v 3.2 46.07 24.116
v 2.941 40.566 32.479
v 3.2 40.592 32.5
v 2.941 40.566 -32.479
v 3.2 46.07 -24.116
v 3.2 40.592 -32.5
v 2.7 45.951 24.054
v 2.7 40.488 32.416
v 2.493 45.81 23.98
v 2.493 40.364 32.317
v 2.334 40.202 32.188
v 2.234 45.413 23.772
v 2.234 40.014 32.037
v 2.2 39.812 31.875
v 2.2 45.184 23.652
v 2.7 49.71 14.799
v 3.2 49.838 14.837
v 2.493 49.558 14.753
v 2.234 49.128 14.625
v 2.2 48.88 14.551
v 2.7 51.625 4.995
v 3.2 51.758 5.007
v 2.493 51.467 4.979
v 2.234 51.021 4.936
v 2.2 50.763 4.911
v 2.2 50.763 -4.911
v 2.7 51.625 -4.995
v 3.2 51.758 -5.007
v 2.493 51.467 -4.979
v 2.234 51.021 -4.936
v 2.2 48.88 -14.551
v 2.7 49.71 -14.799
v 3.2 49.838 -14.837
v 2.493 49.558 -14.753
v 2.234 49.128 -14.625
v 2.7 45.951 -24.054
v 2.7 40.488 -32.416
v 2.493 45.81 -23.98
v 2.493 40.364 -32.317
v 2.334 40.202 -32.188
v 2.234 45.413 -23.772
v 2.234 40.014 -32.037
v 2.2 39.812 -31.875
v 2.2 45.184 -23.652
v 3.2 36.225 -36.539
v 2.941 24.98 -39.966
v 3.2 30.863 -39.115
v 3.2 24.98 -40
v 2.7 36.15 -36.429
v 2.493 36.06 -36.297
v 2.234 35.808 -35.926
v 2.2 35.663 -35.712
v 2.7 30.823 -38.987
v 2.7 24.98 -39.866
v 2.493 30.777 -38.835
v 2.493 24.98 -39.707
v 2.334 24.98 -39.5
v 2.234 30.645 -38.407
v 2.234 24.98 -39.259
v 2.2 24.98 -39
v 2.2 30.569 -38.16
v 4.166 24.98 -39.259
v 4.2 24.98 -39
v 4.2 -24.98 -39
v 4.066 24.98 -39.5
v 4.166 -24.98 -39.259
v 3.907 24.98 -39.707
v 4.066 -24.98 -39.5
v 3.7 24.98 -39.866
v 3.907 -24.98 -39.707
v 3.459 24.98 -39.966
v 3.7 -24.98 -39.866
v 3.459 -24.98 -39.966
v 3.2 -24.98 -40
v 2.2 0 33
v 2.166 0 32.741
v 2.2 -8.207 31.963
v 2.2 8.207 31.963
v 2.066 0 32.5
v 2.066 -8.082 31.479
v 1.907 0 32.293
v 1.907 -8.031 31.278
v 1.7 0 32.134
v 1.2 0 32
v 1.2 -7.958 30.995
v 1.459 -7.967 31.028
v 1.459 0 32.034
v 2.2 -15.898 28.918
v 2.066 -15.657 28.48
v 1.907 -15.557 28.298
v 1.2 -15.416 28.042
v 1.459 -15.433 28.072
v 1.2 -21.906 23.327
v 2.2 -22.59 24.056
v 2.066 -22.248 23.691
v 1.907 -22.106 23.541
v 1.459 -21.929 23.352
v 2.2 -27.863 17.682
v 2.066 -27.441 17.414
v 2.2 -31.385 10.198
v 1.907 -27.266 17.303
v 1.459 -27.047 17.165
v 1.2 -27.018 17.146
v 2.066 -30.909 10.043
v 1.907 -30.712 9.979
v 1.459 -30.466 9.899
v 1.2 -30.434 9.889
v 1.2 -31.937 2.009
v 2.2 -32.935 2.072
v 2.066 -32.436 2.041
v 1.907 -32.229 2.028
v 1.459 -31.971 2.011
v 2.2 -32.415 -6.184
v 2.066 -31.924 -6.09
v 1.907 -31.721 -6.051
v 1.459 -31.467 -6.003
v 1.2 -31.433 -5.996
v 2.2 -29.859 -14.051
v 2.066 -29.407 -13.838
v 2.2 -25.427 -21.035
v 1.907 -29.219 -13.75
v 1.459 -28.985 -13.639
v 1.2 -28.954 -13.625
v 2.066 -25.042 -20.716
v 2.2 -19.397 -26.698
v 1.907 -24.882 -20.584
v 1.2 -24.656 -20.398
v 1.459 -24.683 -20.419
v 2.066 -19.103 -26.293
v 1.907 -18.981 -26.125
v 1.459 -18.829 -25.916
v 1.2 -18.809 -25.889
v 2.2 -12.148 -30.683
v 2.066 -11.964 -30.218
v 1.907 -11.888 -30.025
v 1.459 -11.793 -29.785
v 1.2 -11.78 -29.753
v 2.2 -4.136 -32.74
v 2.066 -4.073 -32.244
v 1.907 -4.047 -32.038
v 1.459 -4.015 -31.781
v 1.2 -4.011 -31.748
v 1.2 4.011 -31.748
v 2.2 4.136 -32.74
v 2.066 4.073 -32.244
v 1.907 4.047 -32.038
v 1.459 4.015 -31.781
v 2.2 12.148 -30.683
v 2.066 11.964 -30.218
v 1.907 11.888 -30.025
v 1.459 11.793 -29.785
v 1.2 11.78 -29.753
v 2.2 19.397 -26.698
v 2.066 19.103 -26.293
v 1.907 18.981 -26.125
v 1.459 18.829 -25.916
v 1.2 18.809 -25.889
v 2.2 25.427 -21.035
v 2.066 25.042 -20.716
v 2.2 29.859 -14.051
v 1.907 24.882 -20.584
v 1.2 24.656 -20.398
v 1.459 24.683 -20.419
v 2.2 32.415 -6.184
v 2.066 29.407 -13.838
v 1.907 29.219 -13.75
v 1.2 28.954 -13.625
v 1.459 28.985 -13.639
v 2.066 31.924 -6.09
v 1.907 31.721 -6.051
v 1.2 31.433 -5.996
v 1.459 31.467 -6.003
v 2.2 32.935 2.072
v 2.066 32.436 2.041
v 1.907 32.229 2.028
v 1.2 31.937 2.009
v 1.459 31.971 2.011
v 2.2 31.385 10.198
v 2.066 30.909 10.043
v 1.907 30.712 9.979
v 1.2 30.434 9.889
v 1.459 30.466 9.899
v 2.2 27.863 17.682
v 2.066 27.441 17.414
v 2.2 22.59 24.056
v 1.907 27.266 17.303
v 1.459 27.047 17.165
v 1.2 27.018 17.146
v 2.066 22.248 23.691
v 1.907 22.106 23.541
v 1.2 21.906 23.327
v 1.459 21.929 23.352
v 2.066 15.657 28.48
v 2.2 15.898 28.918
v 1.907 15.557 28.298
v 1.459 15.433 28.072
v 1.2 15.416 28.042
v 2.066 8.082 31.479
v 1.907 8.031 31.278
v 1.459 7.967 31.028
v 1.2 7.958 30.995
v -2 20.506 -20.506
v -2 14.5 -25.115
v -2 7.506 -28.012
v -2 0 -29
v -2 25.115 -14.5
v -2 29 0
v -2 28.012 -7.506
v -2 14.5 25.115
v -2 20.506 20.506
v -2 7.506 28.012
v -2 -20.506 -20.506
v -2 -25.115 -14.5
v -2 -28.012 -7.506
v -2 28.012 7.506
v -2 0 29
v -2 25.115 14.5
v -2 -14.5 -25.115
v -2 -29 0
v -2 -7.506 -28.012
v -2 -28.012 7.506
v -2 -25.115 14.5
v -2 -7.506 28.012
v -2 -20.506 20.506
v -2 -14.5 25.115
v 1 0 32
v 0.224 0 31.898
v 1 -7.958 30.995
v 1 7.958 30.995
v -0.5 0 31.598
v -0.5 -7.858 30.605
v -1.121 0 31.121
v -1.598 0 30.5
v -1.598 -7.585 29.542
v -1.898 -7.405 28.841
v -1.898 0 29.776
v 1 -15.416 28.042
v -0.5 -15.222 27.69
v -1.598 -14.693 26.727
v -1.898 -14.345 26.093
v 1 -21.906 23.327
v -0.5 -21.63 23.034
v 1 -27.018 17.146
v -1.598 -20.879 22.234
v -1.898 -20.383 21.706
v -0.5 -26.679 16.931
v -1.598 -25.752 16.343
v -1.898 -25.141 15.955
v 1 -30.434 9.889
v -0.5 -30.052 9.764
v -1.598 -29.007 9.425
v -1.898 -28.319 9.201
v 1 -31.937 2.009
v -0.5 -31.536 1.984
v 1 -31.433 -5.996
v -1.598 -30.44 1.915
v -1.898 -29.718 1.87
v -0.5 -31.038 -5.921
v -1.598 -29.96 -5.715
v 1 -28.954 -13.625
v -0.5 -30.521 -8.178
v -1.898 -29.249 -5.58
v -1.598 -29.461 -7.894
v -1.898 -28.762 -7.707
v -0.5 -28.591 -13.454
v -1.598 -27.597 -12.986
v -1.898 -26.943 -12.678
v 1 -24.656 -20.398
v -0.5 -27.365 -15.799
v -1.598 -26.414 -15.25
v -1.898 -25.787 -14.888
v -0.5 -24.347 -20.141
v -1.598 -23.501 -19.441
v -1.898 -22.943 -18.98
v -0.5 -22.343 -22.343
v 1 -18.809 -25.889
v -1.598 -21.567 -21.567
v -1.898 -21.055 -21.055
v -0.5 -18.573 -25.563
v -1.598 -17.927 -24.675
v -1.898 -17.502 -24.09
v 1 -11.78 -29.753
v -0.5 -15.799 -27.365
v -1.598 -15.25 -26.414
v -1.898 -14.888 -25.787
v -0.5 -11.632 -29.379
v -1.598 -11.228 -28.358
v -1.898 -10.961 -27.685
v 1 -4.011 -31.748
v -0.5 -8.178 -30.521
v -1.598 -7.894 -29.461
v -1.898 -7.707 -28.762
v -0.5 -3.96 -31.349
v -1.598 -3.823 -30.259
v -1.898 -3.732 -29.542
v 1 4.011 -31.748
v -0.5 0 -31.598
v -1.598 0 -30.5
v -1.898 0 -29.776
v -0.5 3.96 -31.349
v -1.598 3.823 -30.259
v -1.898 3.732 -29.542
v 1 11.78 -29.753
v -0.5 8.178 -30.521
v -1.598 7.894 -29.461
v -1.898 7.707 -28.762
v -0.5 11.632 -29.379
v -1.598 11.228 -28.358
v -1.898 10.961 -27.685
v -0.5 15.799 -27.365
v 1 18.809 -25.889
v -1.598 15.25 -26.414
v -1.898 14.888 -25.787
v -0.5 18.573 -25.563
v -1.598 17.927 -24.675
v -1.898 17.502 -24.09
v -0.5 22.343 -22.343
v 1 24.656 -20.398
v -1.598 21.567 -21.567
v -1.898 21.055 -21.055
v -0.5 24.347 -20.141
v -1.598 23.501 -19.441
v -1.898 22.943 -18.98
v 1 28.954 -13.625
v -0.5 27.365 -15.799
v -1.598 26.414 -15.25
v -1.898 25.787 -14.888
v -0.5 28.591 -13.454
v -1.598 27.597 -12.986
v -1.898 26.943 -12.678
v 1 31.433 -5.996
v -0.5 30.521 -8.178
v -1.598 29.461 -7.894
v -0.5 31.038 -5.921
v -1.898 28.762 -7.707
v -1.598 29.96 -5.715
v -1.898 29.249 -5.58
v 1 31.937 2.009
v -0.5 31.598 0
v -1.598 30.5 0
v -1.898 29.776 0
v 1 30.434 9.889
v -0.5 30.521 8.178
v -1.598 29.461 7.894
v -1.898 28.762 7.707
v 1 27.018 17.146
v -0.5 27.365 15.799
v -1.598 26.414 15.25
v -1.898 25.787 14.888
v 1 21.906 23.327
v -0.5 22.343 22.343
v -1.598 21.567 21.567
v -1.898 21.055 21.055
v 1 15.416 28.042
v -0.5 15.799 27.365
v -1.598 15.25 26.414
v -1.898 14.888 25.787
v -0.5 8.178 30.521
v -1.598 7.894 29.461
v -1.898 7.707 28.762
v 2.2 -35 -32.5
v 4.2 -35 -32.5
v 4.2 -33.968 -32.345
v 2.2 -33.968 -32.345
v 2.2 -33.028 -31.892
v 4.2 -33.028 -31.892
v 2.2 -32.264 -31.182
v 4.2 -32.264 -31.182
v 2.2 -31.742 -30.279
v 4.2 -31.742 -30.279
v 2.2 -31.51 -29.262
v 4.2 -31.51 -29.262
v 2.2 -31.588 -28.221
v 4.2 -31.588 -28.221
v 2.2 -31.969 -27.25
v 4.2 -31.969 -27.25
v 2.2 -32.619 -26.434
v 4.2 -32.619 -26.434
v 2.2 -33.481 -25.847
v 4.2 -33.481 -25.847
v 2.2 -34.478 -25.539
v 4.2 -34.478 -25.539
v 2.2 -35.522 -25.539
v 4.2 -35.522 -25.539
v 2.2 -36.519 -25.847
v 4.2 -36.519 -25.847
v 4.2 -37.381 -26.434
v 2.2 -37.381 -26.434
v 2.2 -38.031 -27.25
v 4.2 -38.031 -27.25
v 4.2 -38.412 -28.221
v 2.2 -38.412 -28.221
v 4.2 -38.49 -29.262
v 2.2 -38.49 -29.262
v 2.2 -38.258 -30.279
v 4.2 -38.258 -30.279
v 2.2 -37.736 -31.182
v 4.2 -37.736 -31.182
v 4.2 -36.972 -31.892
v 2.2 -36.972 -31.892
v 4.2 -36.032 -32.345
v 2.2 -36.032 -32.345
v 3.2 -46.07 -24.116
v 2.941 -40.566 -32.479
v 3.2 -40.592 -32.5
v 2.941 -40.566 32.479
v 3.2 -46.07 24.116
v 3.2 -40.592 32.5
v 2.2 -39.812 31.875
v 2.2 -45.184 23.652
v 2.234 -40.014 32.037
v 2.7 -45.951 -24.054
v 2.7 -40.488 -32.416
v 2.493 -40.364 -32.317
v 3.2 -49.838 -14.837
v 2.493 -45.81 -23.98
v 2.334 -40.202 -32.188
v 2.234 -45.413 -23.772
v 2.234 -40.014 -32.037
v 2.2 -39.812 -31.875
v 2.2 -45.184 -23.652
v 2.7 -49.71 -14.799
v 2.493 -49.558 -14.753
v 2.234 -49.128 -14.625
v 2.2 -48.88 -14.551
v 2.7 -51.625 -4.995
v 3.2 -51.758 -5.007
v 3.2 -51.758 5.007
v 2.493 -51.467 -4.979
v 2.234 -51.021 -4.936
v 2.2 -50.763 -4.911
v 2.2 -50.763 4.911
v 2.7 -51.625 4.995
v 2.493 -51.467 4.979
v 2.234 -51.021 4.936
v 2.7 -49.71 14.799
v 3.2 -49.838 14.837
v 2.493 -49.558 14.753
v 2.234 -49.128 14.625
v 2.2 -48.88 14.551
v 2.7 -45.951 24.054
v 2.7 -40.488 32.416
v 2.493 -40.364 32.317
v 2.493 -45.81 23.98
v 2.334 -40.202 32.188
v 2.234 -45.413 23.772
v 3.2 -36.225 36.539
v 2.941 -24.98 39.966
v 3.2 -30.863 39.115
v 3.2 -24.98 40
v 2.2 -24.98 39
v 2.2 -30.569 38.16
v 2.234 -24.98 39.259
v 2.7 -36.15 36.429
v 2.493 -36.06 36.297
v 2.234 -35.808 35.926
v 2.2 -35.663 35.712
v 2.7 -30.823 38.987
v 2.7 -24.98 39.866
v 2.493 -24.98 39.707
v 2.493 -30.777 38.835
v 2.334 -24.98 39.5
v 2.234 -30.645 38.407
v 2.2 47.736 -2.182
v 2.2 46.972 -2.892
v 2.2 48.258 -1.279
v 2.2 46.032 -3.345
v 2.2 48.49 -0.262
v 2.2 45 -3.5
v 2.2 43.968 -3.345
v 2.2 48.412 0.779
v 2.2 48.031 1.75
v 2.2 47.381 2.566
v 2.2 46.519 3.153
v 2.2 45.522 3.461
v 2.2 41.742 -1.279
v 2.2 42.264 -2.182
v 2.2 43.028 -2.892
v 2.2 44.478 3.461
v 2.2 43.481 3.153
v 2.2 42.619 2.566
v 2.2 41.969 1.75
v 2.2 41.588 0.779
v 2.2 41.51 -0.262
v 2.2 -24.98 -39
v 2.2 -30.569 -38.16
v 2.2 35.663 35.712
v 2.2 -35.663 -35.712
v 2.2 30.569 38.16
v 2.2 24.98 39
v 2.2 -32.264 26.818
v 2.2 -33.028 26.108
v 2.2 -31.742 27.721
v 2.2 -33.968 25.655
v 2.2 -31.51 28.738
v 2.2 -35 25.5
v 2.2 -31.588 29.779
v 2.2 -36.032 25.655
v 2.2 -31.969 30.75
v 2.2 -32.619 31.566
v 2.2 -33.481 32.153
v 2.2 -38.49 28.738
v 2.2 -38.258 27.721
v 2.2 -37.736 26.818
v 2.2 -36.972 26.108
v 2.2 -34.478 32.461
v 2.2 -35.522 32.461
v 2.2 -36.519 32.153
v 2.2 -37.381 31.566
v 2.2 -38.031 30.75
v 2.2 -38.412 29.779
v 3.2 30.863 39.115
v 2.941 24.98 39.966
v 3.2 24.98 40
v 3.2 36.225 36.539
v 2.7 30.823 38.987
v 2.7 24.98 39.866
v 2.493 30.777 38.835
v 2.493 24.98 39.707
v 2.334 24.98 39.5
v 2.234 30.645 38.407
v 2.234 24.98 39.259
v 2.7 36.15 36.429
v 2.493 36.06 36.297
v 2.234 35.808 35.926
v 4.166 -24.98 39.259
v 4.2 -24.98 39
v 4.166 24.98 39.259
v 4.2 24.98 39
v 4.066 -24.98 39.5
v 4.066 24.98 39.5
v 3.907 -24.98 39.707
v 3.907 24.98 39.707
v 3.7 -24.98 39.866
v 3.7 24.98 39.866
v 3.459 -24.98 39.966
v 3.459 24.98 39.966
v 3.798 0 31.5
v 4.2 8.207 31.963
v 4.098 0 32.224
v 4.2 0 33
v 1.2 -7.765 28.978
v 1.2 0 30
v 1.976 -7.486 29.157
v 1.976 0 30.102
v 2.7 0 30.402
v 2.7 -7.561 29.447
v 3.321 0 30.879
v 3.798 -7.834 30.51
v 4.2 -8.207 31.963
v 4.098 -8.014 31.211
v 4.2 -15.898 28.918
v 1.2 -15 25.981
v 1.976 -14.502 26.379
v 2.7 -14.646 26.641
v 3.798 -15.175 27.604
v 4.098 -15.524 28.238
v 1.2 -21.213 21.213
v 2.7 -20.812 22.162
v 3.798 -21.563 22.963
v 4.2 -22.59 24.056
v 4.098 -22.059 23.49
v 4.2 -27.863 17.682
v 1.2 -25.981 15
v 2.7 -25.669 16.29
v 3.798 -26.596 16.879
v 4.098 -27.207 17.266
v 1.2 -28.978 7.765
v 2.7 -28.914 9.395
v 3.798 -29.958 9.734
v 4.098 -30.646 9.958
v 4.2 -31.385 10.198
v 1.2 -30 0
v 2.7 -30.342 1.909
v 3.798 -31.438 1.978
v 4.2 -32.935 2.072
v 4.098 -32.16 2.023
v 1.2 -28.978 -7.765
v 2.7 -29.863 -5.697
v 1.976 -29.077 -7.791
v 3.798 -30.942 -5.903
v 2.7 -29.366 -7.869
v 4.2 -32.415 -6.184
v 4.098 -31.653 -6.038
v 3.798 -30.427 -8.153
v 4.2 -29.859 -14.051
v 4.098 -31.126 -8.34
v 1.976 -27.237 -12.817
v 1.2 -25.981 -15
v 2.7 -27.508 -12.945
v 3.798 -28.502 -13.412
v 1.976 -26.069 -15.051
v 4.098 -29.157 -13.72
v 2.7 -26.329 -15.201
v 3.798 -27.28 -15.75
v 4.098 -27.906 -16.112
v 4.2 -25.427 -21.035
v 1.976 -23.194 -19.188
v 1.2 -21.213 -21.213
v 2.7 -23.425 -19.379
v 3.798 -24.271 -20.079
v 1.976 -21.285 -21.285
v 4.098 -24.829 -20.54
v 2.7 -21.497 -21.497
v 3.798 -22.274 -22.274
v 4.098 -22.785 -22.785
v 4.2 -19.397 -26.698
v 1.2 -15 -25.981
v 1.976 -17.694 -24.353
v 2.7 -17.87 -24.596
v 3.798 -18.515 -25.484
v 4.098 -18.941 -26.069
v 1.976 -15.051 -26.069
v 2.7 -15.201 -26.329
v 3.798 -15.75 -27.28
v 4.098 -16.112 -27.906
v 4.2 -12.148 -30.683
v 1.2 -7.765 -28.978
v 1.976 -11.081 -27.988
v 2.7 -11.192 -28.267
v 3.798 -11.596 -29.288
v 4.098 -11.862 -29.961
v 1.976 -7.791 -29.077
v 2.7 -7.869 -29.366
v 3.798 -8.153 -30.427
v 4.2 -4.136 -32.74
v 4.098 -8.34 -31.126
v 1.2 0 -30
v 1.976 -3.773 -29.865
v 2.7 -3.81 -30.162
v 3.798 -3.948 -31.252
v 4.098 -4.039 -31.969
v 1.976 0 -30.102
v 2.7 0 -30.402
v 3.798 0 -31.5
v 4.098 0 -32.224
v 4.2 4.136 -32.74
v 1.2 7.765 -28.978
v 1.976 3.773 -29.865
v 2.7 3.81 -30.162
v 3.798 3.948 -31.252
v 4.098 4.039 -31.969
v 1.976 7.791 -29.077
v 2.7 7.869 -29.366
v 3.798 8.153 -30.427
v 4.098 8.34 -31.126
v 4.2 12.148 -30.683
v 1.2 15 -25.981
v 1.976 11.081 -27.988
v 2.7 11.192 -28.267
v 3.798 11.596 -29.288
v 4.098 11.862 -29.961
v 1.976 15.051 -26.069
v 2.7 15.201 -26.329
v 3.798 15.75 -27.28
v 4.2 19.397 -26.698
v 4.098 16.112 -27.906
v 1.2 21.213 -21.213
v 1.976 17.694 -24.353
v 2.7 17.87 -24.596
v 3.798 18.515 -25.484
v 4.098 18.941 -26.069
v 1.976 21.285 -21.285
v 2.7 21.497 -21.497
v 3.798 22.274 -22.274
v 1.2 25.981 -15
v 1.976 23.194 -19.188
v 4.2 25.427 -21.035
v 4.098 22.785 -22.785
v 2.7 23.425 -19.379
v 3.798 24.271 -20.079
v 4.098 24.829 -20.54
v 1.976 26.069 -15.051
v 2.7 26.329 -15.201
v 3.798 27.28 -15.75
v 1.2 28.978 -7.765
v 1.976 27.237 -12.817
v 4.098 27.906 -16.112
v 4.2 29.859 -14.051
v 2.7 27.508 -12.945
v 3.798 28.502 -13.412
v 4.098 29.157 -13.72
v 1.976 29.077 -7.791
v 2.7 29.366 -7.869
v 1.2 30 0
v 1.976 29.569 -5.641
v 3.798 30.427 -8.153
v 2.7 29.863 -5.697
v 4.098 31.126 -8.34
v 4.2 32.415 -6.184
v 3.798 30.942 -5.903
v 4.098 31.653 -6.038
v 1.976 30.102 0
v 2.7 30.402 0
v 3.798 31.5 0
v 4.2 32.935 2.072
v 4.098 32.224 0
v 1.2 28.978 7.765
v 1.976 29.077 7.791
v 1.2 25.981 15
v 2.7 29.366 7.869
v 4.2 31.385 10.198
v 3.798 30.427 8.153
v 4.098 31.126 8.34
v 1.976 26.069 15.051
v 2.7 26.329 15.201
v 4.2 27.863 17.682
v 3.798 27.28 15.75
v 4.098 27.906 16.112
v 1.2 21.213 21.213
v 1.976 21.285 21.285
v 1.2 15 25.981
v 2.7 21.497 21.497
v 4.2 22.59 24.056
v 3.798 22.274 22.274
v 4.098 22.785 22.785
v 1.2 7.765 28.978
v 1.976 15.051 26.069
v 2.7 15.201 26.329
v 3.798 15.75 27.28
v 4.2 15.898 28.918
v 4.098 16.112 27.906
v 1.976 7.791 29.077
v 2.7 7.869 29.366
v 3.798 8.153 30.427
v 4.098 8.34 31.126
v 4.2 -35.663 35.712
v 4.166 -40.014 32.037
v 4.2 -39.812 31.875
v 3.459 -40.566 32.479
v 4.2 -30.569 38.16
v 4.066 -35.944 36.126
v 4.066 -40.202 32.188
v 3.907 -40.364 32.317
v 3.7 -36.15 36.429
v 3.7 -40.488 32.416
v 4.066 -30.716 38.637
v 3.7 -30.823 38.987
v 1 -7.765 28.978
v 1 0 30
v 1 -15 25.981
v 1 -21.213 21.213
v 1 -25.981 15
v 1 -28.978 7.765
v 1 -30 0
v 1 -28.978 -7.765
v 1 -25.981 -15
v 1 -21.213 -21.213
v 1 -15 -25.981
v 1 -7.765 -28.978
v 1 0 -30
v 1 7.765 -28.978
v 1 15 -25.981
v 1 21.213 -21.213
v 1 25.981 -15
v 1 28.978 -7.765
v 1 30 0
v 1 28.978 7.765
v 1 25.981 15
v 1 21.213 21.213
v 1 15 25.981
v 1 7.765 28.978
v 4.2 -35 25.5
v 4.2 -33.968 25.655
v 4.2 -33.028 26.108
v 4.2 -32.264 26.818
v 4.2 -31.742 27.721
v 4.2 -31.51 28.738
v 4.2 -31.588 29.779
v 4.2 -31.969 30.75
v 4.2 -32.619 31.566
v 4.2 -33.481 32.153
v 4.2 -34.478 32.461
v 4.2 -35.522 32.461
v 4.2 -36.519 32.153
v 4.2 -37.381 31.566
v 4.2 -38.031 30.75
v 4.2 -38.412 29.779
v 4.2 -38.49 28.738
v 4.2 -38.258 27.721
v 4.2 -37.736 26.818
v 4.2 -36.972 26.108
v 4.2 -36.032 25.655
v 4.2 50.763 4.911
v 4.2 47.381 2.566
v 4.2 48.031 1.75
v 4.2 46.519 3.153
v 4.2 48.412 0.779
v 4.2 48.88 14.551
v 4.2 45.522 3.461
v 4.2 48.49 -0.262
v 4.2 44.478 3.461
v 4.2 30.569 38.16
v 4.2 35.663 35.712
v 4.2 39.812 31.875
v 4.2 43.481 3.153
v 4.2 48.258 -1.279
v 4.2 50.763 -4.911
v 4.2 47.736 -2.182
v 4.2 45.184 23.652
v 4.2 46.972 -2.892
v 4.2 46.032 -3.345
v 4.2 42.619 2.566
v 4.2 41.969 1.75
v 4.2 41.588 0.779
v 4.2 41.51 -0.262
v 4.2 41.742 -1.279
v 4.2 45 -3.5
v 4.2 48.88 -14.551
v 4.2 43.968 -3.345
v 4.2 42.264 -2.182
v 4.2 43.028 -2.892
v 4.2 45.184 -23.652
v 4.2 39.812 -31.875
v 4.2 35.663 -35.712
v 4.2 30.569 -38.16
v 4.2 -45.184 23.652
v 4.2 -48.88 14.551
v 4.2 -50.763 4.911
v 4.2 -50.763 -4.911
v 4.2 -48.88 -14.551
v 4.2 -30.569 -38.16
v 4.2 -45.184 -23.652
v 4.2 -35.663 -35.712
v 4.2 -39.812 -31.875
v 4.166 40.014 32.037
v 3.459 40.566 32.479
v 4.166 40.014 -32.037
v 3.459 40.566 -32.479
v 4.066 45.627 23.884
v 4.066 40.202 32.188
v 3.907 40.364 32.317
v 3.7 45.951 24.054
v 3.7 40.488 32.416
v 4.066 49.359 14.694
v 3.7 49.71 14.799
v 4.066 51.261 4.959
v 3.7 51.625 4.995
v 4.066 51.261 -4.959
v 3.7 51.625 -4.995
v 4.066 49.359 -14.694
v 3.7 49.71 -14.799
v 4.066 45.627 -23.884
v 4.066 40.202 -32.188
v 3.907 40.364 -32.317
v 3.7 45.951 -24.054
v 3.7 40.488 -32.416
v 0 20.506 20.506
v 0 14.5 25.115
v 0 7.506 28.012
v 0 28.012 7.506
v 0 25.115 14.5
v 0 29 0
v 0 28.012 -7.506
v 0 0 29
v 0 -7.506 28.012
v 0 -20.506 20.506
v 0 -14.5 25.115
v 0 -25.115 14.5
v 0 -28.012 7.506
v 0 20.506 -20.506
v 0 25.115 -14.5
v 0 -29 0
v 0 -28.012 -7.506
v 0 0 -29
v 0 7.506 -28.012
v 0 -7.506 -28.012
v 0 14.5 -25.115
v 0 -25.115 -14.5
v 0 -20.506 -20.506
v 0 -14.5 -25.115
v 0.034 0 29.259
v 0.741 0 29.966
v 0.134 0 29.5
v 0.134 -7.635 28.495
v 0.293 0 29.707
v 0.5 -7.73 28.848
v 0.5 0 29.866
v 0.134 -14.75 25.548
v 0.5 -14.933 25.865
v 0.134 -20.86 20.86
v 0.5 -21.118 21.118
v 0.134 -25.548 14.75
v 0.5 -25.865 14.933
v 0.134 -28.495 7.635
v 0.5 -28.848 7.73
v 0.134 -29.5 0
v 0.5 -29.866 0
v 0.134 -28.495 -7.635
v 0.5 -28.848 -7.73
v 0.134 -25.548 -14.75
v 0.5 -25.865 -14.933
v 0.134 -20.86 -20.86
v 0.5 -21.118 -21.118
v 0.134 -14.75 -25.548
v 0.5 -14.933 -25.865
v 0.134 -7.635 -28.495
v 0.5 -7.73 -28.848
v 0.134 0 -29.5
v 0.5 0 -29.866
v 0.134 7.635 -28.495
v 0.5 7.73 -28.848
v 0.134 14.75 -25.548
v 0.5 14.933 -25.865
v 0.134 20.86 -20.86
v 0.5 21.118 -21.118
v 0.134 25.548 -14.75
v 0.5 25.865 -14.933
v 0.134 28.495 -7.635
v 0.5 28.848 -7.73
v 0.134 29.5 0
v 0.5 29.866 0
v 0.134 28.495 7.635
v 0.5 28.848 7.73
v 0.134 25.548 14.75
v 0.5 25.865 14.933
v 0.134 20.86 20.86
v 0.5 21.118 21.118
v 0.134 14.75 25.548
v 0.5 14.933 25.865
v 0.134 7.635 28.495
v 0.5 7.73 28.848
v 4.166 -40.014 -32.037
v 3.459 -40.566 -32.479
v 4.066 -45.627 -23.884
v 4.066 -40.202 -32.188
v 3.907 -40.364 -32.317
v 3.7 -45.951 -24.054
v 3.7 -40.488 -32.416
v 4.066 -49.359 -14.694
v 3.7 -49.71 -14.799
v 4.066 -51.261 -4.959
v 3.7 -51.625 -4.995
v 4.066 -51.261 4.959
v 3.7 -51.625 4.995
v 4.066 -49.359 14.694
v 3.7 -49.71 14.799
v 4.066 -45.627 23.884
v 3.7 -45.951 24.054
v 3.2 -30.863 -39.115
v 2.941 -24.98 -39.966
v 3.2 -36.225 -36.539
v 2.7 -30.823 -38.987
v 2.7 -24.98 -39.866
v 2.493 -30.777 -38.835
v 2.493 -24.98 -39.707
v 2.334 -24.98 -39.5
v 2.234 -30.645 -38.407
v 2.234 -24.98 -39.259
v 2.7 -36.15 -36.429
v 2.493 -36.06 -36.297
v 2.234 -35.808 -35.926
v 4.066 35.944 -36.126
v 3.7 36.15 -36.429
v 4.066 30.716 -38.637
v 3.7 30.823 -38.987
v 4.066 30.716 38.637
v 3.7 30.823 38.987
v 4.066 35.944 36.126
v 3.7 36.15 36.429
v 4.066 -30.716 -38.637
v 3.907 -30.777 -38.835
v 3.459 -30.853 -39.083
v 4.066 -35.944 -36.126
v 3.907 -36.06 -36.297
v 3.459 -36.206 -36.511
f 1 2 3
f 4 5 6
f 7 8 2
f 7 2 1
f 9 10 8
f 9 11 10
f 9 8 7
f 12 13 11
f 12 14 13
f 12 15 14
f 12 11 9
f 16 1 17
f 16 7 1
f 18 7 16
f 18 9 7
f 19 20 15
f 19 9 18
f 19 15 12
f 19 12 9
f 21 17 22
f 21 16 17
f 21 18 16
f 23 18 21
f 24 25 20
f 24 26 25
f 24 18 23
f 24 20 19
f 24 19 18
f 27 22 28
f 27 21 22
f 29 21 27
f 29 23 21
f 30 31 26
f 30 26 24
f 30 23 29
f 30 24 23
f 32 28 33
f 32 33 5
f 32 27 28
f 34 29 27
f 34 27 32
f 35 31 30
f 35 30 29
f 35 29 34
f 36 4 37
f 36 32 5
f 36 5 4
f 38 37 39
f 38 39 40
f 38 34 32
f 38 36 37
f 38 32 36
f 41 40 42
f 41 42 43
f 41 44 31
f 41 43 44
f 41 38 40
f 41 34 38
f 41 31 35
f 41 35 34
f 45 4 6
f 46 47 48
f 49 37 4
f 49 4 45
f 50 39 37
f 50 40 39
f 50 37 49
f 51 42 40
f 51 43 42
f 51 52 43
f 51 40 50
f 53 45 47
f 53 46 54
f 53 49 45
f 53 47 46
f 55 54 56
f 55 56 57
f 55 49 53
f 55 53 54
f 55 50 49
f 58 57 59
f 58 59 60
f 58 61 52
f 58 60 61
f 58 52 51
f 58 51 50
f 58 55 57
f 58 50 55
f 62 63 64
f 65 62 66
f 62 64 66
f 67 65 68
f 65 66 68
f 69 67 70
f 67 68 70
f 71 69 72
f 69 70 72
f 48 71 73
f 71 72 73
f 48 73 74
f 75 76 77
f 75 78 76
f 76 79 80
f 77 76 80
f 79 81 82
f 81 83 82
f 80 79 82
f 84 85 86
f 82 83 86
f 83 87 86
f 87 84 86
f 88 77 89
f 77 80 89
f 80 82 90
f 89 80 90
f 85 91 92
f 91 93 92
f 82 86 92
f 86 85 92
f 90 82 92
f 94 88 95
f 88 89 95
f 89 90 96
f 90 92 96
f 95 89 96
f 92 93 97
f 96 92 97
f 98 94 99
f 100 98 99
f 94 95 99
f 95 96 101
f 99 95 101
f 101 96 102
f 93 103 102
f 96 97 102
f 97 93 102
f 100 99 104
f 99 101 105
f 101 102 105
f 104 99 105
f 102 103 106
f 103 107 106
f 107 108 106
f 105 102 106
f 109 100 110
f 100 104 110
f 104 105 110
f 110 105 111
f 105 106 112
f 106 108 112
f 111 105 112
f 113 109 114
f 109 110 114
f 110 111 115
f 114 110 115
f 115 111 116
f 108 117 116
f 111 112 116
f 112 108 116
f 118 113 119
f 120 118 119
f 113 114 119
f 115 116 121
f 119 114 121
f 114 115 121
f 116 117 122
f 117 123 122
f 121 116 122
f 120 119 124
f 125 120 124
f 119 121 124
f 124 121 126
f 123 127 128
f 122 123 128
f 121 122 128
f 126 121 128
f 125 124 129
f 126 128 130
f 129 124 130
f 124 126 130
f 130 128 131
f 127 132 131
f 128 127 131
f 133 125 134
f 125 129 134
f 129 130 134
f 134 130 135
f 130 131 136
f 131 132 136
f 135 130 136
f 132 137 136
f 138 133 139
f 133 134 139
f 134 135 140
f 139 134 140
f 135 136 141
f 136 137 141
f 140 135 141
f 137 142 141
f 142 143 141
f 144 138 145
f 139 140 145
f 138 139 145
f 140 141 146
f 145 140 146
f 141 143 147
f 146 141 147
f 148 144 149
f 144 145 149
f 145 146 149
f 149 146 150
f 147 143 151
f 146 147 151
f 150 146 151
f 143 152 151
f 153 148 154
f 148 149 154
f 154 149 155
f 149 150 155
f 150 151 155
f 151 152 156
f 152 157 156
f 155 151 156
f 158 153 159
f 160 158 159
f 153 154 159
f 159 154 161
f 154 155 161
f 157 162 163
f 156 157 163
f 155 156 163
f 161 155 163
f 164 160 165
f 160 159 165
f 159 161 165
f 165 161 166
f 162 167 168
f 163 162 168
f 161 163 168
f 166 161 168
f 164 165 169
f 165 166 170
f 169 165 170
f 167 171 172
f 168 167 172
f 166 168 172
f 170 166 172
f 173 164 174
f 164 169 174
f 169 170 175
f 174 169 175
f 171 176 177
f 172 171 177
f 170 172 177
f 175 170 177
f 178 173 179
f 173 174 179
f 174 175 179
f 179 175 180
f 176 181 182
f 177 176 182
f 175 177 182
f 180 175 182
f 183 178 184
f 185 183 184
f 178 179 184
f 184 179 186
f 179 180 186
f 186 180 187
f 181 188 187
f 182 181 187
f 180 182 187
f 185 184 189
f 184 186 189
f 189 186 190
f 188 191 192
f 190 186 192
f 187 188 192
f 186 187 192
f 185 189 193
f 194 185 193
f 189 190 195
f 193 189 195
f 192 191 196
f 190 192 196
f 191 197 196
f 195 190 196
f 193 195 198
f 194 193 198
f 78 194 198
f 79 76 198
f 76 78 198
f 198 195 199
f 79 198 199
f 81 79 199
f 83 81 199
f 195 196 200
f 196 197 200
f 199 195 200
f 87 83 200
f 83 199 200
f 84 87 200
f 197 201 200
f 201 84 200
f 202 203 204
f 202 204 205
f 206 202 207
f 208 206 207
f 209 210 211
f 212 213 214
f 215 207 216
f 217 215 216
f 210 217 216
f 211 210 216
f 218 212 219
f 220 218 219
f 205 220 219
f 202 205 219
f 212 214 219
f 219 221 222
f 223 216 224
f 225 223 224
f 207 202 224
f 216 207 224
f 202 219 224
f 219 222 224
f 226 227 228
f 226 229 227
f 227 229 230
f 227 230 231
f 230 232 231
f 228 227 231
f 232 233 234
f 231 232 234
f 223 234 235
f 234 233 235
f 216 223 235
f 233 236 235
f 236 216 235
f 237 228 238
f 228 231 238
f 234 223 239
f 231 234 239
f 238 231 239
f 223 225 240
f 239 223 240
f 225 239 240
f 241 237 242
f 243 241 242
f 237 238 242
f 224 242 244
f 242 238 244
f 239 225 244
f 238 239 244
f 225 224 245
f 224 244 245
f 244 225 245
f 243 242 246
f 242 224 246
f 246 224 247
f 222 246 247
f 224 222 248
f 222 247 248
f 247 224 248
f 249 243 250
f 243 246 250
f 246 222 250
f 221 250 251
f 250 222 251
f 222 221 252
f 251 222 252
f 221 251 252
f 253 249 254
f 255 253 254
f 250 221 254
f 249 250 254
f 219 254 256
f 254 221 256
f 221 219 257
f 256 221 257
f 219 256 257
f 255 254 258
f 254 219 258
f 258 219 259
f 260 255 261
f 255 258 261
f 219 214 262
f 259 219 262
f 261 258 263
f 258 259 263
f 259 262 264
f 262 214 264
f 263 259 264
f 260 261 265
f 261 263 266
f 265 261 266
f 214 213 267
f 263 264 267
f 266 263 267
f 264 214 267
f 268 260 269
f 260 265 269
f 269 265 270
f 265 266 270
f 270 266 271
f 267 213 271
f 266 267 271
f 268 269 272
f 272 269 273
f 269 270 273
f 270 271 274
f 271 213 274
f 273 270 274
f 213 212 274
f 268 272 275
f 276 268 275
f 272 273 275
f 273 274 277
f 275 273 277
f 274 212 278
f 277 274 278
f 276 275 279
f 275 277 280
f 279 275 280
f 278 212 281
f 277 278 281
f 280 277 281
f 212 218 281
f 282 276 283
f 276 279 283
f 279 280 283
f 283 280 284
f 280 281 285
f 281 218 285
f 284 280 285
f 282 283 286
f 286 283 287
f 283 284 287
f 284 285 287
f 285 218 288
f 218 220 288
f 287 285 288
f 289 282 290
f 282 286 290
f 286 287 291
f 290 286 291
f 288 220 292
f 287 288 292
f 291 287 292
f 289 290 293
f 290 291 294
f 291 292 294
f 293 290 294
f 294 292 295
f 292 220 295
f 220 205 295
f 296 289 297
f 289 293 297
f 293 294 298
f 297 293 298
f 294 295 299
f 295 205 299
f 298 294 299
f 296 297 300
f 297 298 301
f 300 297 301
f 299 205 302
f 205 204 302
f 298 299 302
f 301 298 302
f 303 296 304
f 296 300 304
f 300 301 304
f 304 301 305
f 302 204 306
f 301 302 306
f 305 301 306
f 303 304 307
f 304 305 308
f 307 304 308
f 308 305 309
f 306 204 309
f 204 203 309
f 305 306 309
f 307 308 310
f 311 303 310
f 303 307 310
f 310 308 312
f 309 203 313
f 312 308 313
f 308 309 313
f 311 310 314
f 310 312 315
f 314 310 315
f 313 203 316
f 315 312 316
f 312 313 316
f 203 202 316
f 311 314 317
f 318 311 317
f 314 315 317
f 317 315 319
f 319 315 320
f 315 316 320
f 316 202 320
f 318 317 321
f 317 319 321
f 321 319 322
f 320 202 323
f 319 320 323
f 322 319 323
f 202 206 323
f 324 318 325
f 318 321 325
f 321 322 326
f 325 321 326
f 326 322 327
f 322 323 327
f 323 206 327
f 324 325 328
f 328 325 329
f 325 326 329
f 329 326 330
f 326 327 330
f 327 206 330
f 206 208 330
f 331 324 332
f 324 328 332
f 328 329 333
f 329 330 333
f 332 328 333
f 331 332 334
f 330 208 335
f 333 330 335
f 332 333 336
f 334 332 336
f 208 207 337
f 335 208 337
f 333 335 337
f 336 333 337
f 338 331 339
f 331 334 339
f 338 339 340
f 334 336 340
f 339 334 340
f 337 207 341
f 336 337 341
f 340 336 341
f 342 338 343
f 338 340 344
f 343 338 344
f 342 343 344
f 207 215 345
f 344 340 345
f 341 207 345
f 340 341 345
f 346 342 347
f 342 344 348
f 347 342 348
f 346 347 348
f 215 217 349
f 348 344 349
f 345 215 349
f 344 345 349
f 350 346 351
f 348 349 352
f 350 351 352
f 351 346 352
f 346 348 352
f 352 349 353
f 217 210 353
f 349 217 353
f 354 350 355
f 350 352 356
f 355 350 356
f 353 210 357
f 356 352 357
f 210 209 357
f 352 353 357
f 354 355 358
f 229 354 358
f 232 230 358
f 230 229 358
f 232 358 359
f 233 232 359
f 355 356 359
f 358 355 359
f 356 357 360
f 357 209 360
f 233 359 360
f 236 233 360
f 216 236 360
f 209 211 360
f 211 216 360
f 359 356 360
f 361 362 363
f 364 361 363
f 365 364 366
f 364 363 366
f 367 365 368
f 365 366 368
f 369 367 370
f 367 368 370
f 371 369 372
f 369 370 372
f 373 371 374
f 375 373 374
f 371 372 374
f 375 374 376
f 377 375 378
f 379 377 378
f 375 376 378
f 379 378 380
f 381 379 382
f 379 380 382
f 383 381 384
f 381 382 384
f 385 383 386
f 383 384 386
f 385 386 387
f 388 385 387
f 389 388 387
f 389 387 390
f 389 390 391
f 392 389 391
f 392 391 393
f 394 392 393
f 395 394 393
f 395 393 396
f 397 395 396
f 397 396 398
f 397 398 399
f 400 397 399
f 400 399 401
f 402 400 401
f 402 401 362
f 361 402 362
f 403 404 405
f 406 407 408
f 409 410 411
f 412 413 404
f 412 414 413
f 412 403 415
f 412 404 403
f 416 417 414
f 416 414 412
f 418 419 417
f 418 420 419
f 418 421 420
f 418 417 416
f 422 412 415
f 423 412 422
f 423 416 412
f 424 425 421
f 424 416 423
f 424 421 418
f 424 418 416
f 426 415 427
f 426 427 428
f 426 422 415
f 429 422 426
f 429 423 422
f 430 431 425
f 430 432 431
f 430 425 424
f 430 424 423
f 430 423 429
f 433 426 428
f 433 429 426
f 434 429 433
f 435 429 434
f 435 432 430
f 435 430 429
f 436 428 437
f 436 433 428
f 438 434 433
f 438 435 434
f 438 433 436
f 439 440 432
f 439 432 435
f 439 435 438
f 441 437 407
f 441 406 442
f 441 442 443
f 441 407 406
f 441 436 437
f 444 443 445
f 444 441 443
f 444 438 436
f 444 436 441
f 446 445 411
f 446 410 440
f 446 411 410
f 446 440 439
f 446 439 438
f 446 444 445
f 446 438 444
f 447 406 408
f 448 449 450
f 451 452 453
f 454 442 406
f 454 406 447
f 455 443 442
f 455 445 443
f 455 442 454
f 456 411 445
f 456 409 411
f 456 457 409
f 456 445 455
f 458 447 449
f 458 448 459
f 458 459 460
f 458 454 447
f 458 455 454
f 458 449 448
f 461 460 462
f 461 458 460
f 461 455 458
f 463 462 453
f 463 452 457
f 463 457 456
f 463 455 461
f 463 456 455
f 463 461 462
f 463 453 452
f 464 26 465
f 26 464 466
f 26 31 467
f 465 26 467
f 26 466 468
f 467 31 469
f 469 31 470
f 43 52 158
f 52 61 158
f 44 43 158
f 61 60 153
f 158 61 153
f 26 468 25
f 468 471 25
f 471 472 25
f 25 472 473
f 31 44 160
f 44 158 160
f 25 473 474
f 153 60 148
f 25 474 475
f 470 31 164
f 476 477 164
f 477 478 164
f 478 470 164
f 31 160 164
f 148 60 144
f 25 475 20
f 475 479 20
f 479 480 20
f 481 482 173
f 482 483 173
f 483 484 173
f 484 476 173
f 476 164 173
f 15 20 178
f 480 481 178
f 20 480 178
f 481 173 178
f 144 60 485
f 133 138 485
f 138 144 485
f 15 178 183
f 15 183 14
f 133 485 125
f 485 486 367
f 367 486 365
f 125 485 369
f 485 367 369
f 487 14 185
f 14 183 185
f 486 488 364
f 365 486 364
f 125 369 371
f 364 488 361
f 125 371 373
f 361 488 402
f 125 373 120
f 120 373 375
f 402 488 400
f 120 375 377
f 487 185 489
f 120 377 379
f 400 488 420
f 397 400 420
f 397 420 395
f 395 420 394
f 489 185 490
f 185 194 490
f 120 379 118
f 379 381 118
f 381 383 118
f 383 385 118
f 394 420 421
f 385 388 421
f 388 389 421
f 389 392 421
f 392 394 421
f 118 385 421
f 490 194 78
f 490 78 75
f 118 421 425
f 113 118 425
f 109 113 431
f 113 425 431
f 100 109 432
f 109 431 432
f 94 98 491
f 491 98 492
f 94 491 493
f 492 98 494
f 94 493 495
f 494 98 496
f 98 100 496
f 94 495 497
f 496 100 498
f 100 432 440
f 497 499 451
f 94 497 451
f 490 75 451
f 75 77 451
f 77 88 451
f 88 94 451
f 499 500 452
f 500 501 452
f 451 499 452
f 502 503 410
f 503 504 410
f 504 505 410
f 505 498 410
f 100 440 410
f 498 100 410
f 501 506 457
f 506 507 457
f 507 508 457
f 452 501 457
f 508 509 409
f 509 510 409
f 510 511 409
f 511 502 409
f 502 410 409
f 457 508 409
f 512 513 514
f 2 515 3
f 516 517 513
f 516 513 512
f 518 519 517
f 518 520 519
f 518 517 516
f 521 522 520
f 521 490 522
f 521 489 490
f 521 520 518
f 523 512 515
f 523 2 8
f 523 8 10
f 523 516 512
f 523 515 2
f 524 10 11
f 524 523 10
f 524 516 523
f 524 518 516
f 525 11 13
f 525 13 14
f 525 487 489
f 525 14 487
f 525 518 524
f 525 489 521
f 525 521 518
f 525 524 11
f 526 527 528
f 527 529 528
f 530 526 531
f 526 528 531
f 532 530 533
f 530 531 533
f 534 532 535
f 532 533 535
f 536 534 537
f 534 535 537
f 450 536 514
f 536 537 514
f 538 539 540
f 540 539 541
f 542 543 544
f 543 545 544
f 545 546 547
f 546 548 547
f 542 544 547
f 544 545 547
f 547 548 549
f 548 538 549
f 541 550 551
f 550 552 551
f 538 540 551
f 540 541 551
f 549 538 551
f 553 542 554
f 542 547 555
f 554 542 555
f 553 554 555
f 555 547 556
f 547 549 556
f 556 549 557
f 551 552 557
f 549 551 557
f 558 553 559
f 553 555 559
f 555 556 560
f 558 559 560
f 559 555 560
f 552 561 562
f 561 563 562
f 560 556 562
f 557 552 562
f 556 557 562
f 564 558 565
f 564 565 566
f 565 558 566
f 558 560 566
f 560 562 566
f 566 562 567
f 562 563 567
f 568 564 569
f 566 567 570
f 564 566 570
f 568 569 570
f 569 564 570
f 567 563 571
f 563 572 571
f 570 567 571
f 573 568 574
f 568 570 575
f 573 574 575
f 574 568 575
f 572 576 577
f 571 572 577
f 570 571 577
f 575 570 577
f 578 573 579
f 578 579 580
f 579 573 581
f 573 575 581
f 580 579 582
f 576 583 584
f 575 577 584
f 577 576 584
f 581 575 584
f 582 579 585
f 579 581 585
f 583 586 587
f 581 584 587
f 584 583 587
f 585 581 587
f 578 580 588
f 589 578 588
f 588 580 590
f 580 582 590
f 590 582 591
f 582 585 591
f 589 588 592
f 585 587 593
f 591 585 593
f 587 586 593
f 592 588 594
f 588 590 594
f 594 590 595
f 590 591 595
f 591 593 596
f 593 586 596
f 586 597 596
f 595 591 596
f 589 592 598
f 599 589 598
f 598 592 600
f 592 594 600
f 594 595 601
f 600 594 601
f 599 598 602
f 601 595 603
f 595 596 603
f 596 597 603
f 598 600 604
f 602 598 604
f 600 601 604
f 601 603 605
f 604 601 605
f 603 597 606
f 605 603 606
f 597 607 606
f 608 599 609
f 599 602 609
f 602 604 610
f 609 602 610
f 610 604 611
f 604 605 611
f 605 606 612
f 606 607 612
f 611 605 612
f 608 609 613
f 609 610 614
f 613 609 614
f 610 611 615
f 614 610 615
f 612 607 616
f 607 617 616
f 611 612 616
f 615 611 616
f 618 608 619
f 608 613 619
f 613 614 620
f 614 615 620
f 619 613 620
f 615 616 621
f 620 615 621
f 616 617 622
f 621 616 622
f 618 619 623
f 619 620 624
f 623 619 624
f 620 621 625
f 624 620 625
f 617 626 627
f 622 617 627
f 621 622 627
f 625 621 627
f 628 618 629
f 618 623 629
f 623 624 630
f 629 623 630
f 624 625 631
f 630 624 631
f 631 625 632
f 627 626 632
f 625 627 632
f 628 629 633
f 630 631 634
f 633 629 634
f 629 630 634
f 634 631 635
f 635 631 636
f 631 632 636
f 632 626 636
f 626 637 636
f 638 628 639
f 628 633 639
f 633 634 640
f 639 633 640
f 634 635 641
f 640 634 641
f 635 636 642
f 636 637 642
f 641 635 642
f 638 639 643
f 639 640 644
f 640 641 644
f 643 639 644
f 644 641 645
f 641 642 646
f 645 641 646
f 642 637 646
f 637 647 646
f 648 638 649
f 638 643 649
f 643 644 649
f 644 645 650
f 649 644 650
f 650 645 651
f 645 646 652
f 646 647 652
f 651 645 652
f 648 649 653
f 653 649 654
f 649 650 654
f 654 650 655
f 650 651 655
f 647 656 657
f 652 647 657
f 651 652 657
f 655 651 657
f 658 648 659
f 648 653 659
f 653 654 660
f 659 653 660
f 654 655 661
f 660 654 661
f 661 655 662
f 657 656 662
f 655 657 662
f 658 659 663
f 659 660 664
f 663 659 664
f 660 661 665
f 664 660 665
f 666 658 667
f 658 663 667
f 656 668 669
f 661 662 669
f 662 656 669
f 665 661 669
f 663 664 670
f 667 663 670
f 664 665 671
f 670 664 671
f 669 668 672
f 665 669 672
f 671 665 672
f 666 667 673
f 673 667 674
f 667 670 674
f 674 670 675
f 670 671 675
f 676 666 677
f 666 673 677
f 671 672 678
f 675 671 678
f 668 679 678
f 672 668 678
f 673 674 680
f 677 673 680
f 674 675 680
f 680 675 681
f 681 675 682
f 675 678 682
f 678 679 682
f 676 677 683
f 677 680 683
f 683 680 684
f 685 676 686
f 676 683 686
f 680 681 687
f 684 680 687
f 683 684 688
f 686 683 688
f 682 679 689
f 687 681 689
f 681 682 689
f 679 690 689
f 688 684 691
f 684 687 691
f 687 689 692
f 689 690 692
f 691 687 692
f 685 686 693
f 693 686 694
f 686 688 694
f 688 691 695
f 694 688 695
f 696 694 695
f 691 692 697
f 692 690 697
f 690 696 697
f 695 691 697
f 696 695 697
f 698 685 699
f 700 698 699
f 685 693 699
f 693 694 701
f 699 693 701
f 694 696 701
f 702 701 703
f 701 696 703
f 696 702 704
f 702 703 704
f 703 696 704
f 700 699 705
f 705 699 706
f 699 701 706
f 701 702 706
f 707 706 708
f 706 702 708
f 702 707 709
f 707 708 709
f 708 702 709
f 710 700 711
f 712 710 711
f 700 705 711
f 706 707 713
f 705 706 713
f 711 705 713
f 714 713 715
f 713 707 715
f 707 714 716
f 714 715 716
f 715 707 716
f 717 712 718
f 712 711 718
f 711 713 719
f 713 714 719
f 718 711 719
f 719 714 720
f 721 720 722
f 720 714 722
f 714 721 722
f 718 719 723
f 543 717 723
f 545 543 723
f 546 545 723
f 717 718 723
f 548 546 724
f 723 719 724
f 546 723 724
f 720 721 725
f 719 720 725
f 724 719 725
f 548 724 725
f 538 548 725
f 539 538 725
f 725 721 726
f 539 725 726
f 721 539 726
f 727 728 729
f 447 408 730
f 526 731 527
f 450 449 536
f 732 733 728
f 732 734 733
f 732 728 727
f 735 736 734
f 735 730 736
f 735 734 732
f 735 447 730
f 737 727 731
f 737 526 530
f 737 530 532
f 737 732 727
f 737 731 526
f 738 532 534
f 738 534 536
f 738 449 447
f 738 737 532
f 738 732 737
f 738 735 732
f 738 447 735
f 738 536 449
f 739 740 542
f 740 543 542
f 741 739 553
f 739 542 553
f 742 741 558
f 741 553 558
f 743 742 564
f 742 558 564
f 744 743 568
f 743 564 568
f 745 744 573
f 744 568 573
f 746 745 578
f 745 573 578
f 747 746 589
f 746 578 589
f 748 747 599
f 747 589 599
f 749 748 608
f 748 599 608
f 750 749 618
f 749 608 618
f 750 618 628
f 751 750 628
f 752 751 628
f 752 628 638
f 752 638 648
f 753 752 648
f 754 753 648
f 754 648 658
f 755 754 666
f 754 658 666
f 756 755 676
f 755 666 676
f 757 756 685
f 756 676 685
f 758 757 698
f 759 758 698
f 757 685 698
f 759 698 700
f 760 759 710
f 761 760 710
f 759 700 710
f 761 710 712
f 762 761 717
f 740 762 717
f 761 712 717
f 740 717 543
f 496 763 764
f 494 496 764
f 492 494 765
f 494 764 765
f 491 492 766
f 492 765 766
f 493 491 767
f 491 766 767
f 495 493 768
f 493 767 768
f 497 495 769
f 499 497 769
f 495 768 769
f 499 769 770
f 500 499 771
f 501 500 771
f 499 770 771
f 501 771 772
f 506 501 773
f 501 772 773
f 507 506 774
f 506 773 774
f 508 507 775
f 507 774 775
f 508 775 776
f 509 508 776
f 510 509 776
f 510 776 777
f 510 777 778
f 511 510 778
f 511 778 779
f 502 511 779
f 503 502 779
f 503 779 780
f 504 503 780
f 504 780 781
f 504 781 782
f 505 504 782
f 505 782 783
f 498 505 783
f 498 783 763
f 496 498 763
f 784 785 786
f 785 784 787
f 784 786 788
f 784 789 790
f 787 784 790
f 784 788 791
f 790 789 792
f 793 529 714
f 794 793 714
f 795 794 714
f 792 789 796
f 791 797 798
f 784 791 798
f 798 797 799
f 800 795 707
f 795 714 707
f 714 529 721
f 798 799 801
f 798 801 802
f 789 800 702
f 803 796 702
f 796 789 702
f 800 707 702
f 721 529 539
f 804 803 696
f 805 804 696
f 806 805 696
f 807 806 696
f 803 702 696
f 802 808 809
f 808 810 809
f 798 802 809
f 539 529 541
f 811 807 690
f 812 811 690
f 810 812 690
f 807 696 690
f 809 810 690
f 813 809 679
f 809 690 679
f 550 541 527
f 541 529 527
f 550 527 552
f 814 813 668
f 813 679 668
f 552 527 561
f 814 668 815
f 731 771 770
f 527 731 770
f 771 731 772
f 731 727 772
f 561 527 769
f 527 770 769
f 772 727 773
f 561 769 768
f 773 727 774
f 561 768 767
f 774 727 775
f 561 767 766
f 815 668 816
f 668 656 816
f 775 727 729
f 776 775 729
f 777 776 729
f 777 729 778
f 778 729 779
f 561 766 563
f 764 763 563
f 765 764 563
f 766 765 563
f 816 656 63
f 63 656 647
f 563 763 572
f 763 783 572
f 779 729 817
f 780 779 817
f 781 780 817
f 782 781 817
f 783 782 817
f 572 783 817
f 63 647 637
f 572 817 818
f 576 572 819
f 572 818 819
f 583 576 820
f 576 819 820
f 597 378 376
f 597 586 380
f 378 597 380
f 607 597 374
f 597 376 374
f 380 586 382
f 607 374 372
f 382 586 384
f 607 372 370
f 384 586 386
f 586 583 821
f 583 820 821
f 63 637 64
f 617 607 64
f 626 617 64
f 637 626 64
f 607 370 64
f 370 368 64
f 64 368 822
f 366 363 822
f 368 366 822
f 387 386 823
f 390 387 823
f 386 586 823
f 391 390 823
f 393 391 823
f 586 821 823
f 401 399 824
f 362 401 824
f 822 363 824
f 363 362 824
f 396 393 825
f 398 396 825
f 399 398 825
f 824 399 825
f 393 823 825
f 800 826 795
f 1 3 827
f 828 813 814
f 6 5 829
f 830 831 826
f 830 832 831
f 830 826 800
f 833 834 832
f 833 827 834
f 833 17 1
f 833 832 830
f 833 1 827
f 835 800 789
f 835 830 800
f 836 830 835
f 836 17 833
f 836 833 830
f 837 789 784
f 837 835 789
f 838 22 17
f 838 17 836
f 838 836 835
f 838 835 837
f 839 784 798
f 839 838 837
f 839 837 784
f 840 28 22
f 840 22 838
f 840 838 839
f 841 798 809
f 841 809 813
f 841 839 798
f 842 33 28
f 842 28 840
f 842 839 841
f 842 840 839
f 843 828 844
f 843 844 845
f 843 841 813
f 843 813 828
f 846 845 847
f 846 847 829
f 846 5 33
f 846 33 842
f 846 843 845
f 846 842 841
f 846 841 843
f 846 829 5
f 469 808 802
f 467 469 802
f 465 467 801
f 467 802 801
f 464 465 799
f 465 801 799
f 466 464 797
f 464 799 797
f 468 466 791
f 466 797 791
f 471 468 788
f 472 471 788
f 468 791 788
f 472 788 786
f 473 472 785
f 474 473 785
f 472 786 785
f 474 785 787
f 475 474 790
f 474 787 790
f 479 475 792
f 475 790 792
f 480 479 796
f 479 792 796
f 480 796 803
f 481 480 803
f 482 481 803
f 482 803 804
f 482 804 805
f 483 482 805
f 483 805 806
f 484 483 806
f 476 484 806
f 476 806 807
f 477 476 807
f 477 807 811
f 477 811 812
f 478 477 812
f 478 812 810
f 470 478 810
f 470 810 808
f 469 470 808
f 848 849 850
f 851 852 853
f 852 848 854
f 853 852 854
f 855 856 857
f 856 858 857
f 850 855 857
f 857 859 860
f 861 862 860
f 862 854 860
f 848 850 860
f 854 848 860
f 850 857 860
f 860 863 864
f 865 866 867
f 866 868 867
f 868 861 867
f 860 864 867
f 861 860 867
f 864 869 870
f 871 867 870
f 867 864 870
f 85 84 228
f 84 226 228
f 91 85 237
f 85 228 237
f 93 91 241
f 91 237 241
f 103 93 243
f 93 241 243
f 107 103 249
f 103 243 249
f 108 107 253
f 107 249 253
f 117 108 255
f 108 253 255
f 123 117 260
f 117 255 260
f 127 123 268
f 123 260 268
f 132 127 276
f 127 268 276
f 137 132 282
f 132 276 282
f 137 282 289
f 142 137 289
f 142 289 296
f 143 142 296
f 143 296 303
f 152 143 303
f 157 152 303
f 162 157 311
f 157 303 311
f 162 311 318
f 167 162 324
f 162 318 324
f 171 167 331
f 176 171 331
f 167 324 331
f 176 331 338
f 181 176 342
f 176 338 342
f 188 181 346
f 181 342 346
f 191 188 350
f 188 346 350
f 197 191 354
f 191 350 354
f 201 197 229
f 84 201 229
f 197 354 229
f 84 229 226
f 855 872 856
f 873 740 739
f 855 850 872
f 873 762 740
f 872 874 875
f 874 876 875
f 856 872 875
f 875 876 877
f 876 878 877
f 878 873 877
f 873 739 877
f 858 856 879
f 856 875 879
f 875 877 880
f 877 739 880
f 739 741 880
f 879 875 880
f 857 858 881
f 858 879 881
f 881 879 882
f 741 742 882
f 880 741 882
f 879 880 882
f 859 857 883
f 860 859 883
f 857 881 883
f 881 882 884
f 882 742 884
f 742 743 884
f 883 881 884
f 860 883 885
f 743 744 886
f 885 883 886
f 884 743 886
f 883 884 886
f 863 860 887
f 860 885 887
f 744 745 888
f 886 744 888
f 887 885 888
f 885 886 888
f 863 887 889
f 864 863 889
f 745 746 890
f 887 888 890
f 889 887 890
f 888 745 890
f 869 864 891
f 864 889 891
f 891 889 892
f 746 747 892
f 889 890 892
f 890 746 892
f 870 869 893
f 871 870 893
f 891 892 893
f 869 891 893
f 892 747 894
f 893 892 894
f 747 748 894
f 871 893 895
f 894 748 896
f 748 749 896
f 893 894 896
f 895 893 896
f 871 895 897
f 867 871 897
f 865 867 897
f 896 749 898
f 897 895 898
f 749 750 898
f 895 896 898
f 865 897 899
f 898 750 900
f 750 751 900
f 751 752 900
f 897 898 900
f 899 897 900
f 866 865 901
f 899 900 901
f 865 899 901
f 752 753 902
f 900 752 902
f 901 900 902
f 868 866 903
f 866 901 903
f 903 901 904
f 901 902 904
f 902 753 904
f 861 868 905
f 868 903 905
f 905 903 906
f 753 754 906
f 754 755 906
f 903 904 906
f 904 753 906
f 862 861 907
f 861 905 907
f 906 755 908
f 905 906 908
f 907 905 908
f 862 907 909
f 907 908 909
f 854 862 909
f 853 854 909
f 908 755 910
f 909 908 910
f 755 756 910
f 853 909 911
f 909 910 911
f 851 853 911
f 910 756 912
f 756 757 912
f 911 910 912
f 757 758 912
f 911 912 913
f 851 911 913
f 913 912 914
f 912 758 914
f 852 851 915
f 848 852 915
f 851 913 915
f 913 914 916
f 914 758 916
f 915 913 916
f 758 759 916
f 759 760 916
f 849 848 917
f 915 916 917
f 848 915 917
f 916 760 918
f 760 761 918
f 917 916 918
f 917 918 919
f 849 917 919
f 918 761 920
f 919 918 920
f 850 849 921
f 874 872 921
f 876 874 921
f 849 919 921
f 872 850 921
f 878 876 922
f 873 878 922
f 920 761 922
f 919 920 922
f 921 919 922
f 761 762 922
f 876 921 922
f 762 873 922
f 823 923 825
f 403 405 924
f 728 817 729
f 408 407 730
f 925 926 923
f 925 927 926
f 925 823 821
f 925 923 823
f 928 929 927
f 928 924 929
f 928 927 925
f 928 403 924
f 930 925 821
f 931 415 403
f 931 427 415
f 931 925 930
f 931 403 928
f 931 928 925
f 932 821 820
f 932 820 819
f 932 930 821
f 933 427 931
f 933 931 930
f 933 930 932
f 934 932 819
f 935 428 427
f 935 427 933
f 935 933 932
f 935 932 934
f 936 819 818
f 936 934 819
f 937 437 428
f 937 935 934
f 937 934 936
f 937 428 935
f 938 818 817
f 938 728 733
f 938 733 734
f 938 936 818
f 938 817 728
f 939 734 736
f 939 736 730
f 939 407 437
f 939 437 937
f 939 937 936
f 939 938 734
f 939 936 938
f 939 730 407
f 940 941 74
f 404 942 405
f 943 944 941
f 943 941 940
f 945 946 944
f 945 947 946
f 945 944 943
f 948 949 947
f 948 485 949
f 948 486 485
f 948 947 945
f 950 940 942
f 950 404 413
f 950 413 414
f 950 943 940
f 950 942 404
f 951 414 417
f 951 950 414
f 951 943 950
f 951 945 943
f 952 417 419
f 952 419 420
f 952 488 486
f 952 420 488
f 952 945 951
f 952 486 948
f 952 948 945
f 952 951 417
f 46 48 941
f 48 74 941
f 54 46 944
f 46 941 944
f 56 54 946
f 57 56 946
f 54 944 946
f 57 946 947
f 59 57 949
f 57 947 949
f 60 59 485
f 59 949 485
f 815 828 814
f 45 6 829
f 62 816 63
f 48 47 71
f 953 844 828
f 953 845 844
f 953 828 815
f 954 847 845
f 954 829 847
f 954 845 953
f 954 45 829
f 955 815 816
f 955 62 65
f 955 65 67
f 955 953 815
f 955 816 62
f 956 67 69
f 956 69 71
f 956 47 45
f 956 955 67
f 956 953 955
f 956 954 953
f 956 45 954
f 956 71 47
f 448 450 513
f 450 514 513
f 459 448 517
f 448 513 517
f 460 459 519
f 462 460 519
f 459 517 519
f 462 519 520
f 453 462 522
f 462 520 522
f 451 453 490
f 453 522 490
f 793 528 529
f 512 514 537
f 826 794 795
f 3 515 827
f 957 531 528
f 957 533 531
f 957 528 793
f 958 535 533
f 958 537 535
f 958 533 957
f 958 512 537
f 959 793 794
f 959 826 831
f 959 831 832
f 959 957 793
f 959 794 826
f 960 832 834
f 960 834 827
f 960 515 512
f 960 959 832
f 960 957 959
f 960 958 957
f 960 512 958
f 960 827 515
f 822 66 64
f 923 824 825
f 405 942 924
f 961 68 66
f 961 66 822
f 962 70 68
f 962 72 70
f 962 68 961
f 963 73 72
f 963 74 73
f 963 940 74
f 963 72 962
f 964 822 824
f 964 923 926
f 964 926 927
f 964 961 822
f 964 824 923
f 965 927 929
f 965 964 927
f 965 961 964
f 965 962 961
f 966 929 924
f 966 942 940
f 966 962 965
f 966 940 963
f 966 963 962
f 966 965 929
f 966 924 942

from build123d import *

# Parameters (mm, degrees)
SKETCH2_OUTSIDE_W   = 135.442
SKETCH2_OUTSIDE_H   = 135.442
SKETCH2_OUTSIDE_W_2 = 80
SKETCH2_OUTSIDE_H_2 = 104
CUT_EXTRUDE1_DEPTH  = 74.8
SKETCH3_R           = 3.5
CUT_EXTRUDE2_DEPTH  = 10
FILLET1_R           = 20
FILLET2_R           = 1


with BuildPart() as part:
    # Sketch1 → Revolve1 (revolve)
    with BuildSketch(Plane.XY, mode=Mode.PRIVATE) as revolve1_sk:
        with BuildLine():
            Line((0, 0), (0, 29))
            ThreePointArc((0, 29), (0.292893219, 29.707106781), (1, 30))
            Line((1, 30), (1.2, 30))
            ThreePointArc((1.2, 30), (3.321320344, 30.878679656), (4.2, 33))
            Line((4.2, 33), (4.2, 52))
            Line((4.2, 52), (2.2, 52))
            Line((2.2, 52), (2.2, 33))
            ThreePointArc((2.2, 33), (1.907106781, 32.292893219), (1.2, 32))
            Line((1.2, 32), (1, 32))
            ThreePointArc((1, 32), (-1.121320344, 31.121320344), (-2, 29))
            Line((-2, 29), (-2, 0))
            Line((-2, 0), (0, 0))
        make_face()
    revolve(revolve1_sk.sketch.rotate(Axis((-2, 0, 0), (1, 0, 0)), 90), axis=Axis((-2, 0, 0), (1, 0, 0)))

    # Sketch2 outside → Cut-Extrude1 (cut, through all)
    with BuildSketch(Plane(origin=(4.2, 0, 0), x_dir=(0, 0, -1), z_dir=(1, 0, 0))):
        Rectangle(SKETCH2_OUTSIDE_W, SKETCH2_OUTSIDE_H)
        Rectangle(SKETCH2_OUTSIDE_W_2, SKETCH2_OUTSIDE_H_2, mode=Mode.SUBTRACT)
    extrude(amount=-CUT_EXTRUDE1_DEPTH, mode=Mode.SUBTRACT)

    # Sketch3 → Cut-Extrude2 (cut)
    with BuildSketch(Plane(origin=(4.2, 0, 0), x_dir=(0, 0, -1), z_dir=(1, 0, 0))):
        with Locations((0, 45)):
            Circle(SKETCH3_R)
        with Locations((-29, -35)):
            Circle(SKETCH3_R)
        with Locations((29, -35)):
            Circle(SKETCH3_R)
    extrude(amount=-CUT_EXTRUDE2_DEPTH, mode=Mode.SUBTRACT)

    # Fillet1
    fillet1_edges = [part.edges().sort_by_distance(p)[0] for p in [
        (3.2, 33.226495452, 40),
        (3.2, -33.226495452, 40),
        (3.2, -33.226495452, -40),
        (3.2, 33.226495452, -40),
    ]]
    fillet(fillet1_edges, radius=FILLET1_R)

    # Fillet2
    fillet2_edges = [part.edges().sort_by_distance(p)[0] for p in [
        (2.2, 33.640246031, 38.027756377),
        (2.2, 0, 40),
        (2.2, -33.640246031, 38.027756377),
        (2.2, -52, 0),
        (2.2, -33.640246031, -38.027756377),
        (2.2, 0, -40),
        (2.2, 33.640246031, -38.027756377),
        (4.2, 33.640246031, 38.027756377),
        (4.2, 0, 40),
        (4.2, -33.640246031, 38.027756377),
        (4.2, -52, 0),
        (4.2, -33.640246031, -38.027756377),
        (4.2, 0, -40),
        (4.2, 33.640246031, -38.027756377),
        (2.2, 52, 0),
        (4.2, 52, 0),
    ]]
    fillet(fillet2_edges, radius=FILLET2_R - 0.0001)  # a hair under: the kernel refuses the full size


solid = part.part
